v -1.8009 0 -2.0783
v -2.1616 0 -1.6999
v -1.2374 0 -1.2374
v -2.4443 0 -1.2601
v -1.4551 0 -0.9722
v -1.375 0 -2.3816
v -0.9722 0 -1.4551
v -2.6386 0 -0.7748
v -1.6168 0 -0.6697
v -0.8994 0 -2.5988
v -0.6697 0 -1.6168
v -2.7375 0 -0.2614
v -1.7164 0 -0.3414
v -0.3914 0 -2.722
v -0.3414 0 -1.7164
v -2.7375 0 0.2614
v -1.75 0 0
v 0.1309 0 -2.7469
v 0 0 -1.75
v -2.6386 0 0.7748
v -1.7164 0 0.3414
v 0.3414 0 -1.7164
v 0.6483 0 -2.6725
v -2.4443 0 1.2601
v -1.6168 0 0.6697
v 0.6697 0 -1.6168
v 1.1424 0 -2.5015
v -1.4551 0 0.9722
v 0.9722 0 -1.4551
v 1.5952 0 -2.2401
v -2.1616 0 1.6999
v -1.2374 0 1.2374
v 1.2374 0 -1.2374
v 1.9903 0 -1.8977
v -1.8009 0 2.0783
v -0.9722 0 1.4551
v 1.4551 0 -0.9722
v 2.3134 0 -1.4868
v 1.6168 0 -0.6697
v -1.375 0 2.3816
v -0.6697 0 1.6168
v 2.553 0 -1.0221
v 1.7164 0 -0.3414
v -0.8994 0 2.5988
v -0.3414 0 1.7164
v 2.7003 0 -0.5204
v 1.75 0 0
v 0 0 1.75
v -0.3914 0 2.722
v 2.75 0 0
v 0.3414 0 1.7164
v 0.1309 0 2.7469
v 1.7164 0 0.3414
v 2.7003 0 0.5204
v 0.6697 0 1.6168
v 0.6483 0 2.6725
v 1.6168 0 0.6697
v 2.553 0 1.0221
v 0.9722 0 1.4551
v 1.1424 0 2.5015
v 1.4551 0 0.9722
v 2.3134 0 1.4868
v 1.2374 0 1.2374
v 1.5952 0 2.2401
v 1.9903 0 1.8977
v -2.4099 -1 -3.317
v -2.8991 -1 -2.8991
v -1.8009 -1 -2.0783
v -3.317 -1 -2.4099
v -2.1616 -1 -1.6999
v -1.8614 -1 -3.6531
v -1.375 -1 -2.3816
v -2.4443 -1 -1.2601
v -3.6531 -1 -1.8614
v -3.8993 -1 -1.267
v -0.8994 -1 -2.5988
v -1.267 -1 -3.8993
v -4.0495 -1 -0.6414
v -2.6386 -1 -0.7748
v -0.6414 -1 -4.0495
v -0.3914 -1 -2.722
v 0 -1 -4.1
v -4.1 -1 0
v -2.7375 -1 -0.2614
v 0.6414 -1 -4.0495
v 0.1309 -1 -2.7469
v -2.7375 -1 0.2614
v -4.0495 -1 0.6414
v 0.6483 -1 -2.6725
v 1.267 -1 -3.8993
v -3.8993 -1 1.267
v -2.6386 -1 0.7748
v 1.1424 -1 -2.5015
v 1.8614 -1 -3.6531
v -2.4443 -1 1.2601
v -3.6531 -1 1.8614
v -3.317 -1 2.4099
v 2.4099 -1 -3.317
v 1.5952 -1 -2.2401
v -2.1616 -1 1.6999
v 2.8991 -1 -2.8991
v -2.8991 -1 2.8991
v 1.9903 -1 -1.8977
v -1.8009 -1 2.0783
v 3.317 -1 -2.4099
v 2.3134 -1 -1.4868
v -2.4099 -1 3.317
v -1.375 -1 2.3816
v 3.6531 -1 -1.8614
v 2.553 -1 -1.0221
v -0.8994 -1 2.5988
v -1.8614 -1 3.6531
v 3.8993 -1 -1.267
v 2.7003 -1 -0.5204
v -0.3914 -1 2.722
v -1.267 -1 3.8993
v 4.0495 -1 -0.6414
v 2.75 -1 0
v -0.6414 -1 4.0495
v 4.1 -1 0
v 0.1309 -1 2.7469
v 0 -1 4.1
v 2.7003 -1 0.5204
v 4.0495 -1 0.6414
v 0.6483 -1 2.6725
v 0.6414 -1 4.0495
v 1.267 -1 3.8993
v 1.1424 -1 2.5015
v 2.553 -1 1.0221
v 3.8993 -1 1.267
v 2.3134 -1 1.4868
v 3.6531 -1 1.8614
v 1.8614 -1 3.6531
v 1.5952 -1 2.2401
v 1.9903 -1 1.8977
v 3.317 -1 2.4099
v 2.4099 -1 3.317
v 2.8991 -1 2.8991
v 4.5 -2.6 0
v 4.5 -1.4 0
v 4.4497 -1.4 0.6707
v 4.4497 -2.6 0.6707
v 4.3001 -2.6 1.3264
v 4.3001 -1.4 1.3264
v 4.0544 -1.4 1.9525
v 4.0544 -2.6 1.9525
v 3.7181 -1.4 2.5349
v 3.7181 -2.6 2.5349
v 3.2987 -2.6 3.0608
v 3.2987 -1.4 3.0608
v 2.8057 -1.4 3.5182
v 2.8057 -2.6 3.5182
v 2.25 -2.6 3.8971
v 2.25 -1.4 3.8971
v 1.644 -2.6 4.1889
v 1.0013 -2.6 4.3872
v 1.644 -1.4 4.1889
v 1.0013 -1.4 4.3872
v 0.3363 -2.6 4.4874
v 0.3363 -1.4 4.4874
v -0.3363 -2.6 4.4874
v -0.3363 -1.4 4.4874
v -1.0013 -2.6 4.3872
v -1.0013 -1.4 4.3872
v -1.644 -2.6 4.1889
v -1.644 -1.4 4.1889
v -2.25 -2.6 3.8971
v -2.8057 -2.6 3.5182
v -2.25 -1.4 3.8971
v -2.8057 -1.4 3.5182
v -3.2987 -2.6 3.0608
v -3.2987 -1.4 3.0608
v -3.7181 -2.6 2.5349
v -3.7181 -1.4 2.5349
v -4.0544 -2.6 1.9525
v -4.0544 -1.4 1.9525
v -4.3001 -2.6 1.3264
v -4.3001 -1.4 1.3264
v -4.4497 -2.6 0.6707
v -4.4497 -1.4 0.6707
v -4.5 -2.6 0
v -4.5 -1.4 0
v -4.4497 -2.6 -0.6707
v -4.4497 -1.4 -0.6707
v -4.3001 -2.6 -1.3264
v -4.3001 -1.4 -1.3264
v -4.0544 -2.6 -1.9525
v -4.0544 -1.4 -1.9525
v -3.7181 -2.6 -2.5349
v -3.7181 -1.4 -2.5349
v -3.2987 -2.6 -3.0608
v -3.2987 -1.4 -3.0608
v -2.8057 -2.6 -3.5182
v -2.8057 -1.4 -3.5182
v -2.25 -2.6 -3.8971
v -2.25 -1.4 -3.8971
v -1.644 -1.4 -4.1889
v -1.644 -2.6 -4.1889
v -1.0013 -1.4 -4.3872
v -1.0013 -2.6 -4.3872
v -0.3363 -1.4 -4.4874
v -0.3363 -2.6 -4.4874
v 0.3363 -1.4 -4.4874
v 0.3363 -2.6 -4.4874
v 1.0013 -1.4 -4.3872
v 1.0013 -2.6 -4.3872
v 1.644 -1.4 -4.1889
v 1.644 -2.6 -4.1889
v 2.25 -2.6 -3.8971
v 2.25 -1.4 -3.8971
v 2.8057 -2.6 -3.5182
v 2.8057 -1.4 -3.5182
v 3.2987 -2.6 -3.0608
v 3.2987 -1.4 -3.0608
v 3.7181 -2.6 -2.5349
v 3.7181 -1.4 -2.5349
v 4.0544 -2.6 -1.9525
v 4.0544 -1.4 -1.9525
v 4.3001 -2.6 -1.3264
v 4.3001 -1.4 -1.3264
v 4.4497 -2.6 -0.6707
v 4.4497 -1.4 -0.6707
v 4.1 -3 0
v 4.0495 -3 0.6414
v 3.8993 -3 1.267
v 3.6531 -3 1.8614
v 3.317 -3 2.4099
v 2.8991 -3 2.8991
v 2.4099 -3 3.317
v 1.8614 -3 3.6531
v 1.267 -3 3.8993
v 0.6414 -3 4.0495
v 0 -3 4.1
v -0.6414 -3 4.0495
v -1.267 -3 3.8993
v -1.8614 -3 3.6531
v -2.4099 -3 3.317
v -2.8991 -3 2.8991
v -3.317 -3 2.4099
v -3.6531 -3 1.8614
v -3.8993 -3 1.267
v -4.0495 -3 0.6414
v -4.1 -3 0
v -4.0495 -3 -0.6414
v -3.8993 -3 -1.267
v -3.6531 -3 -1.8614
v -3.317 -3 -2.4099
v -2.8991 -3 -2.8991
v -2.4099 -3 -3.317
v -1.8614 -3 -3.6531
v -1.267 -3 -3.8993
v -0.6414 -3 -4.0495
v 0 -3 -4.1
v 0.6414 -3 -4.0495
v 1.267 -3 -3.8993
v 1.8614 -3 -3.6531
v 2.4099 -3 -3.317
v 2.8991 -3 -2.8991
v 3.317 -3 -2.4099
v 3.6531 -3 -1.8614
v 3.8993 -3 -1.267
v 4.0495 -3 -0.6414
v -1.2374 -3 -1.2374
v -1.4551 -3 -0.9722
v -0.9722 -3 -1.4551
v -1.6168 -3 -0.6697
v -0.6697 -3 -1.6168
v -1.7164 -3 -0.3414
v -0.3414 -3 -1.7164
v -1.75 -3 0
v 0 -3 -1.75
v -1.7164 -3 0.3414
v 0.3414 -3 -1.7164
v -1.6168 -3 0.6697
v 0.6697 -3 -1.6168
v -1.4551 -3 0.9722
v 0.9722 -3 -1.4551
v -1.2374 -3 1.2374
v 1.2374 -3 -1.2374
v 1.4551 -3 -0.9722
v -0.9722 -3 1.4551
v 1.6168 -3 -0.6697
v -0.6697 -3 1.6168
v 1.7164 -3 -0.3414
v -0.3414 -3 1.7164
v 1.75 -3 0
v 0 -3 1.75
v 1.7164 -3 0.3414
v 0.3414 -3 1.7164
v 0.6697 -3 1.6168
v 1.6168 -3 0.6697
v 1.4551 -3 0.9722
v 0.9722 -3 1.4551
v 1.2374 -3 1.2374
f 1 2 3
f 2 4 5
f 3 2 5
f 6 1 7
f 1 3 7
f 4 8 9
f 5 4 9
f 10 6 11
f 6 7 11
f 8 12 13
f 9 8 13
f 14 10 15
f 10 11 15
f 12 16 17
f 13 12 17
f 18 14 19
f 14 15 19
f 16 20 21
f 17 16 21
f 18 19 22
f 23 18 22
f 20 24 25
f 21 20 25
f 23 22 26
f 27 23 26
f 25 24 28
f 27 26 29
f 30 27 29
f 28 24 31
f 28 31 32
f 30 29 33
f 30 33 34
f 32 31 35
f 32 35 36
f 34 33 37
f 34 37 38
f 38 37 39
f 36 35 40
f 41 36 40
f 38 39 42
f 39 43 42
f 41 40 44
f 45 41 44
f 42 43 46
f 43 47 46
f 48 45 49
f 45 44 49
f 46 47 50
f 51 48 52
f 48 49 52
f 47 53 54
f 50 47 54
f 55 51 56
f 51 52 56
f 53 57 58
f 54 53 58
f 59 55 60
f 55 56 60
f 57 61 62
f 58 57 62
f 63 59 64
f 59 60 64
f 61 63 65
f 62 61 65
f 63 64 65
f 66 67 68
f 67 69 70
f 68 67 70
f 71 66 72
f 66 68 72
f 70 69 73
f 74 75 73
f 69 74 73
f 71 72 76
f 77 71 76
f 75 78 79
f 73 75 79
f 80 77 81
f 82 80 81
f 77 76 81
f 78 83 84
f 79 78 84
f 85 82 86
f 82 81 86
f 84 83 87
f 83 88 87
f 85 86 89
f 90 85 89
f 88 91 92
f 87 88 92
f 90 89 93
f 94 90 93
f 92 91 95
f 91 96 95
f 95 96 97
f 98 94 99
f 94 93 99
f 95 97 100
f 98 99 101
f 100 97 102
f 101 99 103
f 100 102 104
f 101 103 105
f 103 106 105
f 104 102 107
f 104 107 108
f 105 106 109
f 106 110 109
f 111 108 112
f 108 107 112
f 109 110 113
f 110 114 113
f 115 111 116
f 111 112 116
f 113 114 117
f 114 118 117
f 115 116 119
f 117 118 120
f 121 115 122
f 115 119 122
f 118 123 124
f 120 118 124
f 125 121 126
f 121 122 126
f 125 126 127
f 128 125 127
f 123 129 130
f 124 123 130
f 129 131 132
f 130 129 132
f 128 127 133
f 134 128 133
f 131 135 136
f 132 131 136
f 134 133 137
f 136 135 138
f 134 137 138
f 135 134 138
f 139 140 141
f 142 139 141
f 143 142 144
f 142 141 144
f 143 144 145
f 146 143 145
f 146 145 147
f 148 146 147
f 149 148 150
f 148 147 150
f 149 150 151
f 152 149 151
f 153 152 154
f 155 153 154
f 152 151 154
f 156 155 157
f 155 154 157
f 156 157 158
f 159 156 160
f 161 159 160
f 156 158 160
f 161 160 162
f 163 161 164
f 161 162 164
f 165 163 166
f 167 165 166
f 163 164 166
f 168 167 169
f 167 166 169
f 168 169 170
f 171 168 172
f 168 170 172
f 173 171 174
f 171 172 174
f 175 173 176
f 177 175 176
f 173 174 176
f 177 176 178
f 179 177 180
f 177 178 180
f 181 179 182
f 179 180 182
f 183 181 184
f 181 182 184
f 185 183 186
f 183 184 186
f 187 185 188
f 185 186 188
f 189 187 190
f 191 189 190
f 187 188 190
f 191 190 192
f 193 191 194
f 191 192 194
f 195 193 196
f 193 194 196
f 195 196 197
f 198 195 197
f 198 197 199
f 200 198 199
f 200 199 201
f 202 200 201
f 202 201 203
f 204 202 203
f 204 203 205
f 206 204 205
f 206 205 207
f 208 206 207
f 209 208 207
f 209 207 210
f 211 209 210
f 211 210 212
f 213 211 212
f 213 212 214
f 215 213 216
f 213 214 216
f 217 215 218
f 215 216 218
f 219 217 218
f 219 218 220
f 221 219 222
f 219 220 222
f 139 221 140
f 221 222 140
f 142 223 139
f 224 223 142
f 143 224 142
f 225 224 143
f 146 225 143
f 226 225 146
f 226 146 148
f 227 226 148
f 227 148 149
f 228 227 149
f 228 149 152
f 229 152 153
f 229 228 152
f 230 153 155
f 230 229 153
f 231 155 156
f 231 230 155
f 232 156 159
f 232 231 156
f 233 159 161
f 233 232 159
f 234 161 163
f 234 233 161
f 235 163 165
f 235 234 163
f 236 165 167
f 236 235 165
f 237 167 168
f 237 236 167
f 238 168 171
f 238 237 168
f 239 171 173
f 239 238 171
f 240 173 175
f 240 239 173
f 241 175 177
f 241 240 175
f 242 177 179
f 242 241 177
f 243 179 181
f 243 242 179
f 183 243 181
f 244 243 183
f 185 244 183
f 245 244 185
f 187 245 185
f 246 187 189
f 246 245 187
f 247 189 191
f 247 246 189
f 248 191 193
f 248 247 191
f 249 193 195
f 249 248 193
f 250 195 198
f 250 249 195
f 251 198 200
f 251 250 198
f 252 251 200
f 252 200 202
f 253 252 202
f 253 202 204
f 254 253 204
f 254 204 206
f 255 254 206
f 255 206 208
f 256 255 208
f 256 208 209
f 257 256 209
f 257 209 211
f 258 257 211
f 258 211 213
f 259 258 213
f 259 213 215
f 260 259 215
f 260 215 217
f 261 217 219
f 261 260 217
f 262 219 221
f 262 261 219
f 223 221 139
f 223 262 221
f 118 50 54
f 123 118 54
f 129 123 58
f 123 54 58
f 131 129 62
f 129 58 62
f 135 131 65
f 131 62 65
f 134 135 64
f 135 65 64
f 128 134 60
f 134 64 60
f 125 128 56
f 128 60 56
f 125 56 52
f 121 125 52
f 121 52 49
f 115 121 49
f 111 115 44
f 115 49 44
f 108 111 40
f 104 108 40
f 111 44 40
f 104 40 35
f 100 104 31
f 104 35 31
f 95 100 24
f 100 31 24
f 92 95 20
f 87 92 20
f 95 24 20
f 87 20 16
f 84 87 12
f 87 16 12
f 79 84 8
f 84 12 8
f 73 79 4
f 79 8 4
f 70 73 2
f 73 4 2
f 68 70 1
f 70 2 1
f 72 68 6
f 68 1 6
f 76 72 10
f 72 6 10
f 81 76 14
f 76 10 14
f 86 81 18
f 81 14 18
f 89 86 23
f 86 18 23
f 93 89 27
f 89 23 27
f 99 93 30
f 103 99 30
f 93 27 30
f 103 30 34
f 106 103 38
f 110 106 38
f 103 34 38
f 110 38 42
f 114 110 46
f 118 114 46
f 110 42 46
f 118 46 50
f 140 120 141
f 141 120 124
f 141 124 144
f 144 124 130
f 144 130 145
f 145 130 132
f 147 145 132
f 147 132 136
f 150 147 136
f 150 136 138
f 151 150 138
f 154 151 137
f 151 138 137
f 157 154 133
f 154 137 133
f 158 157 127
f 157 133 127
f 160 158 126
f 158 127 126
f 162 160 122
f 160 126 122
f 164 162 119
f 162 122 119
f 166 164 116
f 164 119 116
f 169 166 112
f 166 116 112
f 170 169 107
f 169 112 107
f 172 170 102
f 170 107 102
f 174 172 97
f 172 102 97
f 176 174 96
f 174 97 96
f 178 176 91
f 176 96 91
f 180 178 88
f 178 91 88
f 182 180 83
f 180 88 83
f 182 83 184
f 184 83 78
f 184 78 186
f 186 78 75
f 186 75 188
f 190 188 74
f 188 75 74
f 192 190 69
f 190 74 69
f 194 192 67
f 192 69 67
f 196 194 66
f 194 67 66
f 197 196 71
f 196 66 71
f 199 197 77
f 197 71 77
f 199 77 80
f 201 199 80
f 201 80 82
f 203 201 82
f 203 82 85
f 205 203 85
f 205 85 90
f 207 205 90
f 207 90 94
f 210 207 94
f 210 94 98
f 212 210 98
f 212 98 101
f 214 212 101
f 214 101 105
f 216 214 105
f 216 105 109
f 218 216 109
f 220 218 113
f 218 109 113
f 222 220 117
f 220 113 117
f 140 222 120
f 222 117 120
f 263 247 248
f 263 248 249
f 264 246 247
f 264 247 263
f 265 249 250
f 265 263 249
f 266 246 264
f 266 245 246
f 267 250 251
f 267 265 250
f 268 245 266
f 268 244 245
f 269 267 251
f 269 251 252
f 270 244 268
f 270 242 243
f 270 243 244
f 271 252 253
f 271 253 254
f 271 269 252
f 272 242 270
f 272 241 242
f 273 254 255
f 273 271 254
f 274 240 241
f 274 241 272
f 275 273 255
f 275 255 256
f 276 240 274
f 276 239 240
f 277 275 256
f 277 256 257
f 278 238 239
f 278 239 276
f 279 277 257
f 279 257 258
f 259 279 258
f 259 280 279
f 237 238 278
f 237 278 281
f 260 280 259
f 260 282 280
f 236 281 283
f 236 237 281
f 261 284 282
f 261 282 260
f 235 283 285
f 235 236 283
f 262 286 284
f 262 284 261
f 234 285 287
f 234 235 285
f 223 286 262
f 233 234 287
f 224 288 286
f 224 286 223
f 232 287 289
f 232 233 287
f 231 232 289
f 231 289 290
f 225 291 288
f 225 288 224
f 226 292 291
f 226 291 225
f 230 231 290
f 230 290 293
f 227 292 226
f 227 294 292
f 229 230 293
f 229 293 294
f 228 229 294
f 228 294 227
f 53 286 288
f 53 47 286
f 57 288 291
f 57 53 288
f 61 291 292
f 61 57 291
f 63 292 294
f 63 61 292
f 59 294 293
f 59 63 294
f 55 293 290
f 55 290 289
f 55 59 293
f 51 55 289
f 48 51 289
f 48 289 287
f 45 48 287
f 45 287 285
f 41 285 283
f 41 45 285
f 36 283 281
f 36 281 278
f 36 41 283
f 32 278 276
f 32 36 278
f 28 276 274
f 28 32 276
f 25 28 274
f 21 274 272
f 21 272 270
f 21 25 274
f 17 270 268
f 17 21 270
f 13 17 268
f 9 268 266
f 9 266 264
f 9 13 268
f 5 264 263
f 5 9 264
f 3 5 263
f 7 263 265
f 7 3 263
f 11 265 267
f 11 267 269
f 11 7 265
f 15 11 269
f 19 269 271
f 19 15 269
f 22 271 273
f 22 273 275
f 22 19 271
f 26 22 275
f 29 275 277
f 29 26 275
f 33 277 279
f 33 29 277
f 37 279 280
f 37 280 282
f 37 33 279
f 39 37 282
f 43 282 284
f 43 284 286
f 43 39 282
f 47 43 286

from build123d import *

# Parameters (mm, degrees)
F0_R     = 2.75
F0_R_2   = 1.75
F1_DEPTH = 1
F2_R     = 4.5
F2_R_2   = 2.75
F2_R_3   = 1.75
F3_DEPTH = 2
F4_SIZE  = 0.4


with BuildPart() as f1:
    # F0 (on Front) → F1 (new body)
    with BuildSketch(Plane.XZ):
        Circle(F0_R)
        Circle(F0_R_2, mode=Mode.SUBTRACT)
    extrude(amount=F1_DEPTH)

    # F2 (on face) → F3 (join)
    with BuildSketch(Plane.XZ.offset(1)):
        Circle(F2_R)
        Circle(F2_R_2, mode=Mode.SUBTRACT)
        Circle(F2_R_2)
        Circle(F2_R_3, mode=Mode.SUBTRACT)
    extrude(amount=F3_DEPTH)

    # F4
    f4_edges = [f1.edges().sort_by_distance(p)[0] for p in [
        (-4.5, -3, 0),
        (-4.5, -1, 0),
    ]]
    chamfer(f4_edges, length=F4_SIZE)


solid = f1.part
